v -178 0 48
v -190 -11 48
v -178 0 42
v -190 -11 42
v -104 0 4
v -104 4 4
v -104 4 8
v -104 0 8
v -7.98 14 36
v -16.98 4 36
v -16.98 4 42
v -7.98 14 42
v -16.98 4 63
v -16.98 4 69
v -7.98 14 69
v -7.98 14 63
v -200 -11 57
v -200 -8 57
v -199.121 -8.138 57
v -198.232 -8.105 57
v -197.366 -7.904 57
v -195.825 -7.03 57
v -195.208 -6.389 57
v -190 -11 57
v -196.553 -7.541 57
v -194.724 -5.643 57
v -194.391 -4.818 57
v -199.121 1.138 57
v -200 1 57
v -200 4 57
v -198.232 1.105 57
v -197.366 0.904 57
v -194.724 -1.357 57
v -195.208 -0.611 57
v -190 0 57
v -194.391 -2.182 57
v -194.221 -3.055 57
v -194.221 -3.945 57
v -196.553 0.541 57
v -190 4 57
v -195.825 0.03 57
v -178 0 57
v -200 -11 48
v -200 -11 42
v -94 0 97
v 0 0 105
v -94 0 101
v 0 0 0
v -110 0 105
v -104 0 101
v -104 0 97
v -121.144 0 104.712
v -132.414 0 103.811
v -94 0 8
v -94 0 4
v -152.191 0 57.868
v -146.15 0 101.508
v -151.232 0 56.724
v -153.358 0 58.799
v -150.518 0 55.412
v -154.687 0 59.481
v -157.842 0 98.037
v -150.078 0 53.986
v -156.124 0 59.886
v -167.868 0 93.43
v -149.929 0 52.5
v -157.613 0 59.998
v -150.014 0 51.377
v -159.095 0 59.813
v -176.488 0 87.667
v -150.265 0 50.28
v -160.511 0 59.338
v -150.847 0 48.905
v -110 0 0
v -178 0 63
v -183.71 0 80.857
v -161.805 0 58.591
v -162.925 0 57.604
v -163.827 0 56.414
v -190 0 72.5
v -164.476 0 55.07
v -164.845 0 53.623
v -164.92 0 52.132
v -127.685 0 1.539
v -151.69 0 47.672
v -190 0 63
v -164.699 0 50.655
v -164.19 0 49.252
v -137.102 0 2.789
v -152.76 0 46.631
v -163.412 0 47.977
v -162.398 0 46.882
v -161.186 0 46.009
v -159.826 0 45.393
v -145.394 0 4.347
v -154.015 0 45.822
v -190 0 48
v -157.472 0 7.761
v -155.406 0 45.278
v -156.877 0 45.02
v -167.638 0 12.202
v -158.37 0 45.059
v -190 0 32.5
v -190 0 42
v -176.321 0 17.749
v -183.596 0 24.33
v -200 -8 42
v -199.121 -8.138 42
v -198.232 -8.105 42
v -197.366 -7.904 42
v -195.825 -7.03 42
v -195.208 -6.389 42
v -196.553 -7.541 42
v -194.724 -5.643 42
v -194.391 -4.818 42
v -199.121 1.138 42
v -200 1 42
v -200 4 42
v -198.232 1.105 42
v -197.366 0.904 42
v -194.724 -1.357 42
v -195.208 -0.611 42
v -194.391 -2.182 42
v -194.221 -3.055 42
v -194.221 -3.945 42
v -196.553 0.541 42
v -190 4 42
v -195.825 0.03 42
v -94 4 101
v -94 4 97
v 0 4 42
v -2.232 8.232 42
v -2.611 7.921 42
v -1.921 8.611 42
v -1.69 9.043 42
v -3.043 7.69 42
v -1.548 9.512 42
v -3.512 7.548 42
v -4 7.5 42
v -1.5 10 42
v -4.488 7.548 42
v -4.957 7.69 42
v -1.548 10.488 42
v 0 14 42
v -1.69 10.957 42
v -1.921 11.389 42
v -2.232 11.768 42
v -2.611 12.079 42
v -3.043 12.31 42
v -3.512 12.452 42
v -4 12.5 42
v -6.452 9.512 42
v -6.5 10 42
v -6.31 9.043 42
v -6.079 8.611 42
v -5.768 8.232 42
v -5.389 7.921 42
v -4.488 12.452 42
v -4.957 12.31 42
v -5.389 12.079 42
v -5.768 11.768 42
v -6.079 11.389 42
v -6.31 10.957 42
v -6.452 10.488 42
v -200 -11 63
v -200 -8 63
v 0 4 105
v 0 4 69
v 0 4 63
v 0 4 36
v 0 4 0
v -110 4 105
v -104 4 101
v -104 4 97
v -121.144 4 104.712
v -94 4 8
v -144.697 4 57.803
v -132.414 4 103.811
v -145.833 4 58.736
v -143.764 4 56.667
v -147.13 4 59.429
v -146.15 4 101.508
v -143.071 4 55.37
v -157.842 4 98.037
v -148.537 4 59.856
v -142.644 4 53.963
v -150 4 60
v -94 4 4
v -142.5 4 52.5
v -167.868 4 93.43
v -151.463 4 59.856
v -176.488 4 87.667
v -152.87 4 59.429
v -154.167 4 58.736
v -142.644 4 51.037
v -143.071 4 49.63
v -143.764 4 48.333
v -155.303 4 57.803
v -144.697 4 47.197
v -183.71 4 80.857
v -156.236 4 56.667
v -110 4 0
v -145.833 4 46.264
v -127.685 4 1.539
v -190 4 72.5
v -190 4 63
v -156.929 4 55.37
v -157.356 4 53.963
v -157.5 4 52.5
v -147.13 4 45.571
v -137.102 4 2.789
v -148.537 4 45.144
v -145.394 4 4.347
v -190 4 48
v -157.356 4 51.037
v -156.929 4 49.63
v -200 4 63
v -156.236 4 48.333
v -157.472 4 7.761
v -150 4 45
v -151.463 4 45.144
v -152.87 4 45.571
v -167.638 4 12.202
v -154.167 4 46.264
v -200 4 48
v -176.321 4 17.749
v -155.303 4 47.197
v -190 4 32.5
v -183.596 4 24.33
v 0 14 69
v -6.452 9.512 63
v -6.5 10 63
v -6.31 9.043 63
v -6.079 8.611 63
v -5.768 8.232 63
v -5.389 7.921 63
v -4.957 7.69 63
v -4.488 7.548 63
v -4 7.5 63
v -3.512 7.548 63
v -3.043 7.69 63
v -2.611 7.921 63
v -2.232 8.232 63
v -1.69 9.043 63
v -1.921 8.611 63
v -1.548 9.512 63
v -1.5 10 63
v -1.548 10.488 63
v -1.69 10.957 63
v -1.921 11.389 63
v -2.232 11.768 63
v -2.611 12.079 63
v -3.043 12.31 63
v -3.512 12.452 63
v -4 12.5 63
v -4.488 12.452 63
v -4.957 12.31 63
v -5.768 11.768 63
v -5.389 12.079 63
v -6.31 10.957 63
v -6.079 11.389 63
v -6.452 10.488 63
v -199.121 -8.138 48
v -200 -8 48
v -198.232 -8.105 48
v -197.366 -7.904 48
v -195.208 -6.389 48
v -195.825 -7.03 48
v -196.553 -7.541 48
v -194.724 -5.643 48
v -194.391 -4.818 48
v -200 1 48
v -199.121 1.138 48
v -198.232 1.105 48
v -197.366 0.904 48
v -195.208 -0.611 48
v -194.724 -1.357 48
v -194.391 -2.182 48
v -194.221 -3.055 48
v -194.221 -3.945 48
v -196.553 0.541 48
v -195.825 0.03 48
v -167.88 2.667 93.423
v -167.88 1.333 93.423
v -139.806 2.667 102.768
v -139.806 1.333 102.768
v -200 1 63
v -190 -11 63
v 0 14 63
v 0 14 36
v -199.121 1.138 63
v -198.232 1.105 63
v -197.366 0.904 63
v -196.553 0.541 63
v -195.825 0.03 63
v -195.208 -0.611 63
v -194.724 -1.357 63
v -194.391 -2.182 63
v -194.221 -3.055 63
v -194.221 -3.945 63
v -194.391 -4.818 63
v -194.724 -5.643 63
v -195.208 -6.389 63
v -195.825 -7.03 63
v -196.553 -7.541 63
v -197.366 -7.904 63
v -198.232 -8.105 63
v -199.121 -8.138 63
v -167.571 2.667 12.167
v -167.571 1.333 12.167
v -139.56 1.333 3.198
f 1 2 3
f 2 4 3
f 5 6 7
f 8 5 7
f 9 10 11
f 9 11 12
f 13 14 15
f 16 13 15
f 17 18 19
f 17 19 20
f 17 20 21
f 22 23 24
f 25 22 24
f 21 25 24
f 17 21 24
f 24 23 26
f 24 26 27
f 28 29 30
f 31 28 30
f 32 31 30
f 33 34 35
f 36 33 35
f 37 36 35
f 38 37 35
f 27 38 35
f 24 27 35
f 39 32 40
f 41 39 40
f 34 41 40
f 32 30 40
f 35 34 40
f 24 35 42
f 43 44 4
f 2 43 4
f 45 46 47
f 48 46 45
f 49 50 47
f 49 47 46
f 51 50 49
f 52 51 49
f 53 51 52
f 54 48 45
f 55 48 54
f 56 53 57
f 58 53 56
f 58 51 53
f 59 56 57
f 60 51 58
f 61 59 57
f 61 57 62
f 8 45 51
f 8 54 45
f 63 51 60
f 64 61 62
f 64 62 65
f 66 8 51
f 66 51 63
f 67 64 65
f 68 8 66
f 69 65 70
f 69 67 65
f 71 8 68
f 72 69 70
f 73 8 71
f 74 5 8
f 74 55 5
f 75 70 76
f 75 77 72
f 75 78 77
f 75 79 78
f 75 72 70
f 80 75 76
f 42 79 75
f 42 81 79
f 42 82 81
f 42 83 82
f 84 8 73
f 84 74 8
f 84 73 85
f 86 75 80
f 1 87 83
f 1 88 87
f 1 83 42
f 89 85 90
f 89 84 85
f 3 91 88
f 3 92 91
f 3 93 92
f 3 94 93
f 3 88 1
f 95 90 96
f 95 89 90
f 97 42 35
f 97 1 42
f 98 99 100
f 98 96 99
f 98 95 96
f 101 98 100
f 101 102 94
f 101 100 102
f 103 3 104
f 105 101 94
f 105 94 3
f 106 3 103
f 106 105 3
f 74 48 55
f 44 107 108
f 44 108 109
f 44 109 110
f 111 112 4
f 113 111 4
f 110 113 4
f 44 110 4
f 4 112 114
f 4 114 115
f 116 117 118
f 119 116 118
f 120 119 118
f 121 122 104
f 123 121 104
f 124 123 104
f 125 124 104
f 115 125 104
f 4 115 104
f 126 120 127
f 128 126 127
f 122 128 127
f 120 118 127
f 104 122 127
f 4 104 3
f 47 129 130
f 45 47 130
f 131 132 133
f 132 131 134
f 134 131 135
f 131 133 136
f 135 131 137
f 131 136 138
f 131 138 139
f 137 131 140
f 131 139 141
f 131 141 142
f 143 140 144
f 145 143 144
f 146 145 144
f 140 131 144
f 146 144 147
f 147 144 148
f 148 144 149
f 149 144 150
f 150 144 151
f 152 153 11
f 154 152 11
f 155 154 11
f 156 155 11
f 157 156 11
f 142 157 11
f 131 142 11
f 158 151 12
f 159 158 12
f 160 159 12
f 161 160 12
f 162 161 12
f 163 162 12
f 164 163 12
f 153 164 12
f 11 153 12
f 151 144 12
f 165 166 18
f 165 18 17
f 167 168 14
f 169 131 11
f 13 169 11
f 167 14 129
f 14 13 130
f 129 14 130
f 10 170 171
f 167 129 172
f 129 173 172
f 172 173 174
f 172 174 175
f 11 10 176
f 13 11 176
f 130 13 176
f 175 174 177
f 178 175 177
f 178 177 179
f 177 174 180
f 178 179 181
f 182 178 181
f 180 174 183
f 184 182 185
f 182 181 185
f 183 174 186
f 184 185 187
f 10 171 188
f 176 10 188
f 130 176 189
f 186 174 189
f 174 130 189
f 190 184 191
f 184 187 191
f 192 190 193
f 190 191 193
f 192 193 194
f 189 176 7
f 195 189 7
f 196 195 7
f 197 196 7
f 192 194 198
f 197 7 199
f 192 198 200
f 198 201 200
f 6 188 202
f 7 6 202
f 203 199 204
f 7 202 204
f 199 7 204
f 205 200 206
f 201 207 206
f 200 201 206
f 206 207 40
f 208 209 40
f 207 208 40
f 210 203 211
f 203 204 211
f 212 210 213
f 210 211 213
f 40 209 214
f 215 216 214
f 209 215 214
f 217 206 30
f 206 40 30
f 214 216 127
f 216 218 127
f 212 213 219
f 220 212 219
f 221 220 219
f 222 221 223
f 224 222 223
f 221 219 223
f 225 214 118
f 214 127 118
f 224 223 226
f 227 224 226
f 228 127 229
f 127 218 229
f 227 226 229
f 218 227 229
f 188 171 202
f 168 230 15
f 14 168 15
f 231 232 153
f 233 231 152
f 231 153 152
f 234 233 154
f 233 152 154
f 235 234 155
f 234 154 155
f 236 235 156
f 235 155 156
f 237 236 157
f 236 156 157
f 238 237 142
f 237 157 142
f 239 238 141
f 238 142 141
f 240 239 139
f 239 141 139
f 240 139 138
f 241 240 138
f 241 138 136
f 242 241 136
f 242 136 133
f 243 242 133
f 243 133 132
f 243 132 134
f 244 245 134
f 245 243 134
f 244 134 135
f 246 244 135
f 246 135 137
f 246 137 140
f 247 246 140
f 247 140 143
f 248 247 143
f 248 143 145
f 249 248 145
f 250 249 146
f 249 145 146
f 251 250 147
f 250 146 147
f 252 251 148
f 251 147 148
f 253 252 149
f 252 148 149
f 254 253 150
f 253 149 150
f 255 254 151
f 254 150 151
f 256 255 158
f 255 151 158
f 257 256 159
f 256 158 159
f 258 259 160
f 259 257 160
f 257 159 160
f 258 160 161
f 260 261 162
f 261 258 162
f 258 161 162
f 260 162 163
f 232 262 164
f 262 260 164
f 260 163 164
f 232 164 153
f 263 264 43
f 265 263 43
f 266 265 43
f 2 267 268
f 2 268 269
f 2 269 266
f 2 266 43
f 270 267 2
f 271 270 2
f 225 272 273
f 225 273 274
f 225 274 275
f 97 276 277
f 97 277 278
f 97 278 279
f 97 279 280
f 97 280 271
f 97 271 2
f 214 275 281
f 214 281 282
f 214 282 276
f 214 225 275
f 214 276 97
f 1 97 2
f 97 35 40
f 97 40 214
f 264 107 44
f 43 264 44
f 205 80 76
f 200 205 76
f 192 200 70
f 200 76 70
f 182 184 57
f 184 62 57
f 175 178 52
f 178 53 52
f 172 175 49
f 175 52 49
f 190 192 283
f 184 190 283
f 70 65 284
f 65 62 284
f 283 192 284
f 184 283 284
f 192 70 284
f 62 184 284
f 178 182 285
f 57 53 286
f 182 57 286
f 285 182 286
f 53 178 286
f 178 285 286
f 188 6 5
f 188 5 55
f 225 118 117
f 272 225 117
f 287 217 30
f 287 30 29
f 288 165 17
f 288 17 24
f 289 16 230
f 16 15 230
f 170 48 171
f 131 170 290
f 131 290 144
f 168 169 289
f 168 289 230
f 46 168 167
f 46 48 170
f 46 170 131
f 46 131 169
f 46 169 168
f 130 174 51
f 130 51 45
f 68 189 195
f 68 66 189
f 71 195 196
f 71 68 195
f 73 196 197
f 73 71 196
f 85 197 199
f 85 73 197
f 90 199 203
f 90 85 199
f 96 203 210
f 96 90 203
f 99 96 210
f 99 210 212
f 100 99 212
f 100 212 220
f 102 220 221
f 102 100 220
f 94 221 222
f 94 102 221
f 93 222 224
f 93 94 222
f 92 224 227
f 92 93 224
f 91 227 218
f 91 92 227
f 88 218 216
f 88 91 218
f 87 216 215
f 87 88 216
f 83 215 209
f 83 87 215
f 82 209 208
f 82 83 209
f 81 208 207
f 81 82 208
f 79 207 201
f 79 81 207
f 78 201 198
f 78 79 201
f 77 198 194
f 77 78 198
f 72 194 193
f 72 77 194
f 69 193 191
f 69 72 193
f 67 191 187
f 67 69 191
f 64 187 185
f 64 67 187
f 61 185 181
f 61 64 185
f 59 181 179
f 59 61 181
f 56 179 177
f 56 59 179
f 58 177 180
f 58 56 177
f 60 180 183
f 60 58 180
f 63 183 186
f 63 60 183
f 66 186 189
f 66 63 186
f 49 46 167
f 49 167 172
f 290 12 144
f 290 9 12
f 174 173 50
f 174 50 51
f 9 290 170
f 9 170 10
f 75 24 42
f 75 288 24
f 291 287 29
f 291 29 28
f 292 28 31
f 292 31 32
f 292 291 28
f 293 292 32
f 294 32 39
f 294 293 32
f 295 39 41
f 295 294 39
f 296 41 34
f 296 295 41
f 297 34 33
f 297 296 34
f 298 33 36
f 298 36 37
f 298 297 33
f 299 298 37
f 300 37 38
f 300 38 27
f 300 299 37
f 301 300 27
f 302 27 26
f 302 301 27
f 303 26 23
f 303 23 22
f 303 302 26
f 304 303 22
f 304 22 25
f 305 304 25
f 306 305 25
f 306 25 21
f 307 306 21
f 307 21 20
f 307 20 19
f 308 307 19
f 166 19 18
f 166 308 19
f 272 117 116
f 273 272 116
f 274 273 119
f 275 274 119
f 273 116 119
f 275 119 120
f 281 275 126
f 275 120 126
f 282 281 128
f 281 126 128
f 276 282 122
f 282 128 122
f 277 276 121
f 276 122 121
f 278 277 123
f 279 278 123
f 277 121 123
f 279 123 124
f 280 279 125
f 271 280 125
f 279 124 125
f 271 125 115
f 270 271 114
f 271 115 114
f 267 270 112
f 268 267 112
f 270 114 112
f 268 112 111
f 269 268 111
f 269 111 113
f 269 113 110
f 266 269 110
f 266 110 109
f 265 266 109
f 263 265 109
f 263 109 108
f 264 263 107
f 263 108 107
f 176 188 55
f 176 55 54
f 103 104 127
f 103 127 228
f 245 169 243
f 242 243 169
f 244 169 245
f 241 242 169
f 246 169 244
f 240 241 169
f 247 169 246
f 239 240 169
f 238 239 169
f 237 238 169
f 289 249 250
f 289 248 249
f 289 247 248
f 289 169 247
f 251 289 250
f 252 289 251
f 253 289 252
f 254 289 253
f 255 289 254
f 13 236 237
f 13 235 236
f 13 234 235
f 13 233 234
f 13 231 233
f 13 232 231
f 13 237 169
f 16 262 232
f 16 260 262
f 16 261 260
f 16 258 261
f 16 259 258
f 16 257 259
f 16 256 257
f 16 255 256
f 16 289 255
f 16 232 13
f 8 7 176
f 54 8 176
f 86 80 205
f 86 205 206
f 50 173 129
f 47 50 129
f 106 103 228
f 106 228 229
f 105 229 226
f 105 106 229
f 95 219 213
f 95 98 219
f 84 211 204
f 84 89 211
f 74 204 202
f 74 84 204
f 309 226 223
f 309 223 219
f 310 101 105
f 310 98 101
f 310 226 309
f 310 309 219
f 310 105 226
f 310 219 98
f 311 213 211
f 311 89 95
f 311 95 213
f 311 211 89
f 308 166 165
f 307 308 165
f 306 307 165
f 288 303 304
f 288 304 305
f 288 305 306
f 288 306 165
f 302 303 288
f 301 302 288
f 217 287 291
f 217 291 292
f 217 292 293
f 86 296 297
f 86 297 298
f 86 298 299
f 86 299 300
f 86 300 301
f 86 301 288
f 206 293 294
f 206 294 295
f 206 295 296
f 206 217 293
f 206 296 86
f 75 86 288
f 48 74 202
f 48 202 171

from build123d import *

# Parameters (mm, degrees)
BOSS_EXTRUDE1_DEPTH = 4
BOSS_EXTRUDE2_START = -45
BOSS_EXTRUDE2_DEPTH = 3
BOSS_EXTRUDE3_START = -39
BOSS_EXTRUDE3_DEPTH = 3
BOSS_EXTRUDE4_REACH = 212.155
SKETCH6_R           = 2.5
SKETCH7_W           = 10
SKETCH7_H           = 4
CUT_EXTRUDE1_DEPTH  = 10
SKETCH8_R           = 7.5


with BuildPart() as part:
    # Sketch1 → Boss-Extrude1 (new body)
    with BuildSketch(Plane(origin=(0, 0, 0), x_dir=(1, 0, 0), z_dir=(0, 1, 0))):
        with BuildLine():
            Line((-110, 0), (0, 0))
            Line((0, 0), (0, -105))
            Line((0, -105), (-110, -105))
            add(Edge.make_bspline(
                [(-190, -72.5), (-172.262756658, -100.700379519), (-139.265999107, -104.836107107), (-110, -105)],
                knots=[0, 0, 0, 0, 1, 1, 1, 1], degree=3))
            Line((-190, -72.5), (-190, -32.5))
            add(Edge.make_bspline(
                [(-190, -32.5), (-171.707374586, -4.618888995), (-138.989901699, -2.178666842), (-110, 0)],
                knots=[0, 0, 0, 0, 1, 1, 1, 1], degree=3))
        make_face()
    extrude(amount=BOSS_EXTRUDE1_DEPTH)

    # Sketch2 → Boss-Extrude2 (add, symmetric)
    with BuildSketch(Plane.XY.offset(105).offset(BOSS_EXTRUDE2_START)):
        with BuildLine():
            Line((-190, 4), (-200, 4))
            Line((-200, 4), (-200, 1))
            ThreePointArc((-200, 1), (-194.2, -3.5), (-200, -8))
            Line((-200, -8), (-200, -11))
            Line((-200, -11), (-190, -11))
            Line((-190, -11), (-178, 0))
            Line((-178, 0), (-190, 4))
        make_face()
    boss_extrude2 = extrude(amount=BOSS_EXTRUDE2_DEPTH, both=True)

    # Mirror1: Boss-Extrude2 across plane
    add(boss_extrude2.mirror(Plane.XY.offset(52.5)))

    # Sketch5 → Boss-Extrude3 (add, symmetric)
    with BuildSketch(Plane.XY.offset(105).offset(BOSS_EXTRUDE3_START)):
        Polygon((-16.979807258, 4), (-7.979807258, 14), (0, 14), (0, 4), align=None)
    boss_extrude3 = extrude(amount=BOSS_EXTRUDE3_DEPTH, both=True)

    # Mirror4: Boss-Extrude3 across plane
    add(boss_extrude3.mirror(Plane.XY.offset(52.5)))

    # Sketch6 → Boss-Extrude4 (add, up to next)
    with BuildSketch(Plane.XY.offset(42), mode=Mode.PRIVATE) as boss_extrude4_sk1:
        with Locations(Location((-4, 10, 0), (0, 0, 180))):
            Circle(SKETCH6_R)
    boss_extrude4_tool1 = extrude(boss_extrude4_sk1.sketch, amount=BOSS_EXTRUDE4_REACH, mode=Mode.PRIVATE) - part.part
    add(boss_extrude4_tool1.solids().sort_by_distance((-4, 10, 42))[0])

    # Sketch7 → Cut-Extrude1 (cut)
    with BuildSketch(Plane(origin=(0, 4, 0), x_dir=(1, 0, 0), z_dir=(0, 1, 0))):
        with Locations((-99, -99)):
            Rectangle(SKETCH7_W, SKETCH7_H)
    cut_extrude1 = extrude(amount=-CUT_EXTRUDE1_DEPTH, mode=Mode.SUBTRACT)

    # Mirror5: Cut-Extrude1 across plane
    add(cut_extrude1.mirror(Plane.XY.offset(52.5)), mode=Mode.SUBTRACT)

    # Cut-Sweep1: sweep along a path in Sketch9
    with BuildLine(Plane.XY.offset(52.5)) as cut_sweep1_path:
        Line((-150, 4), (-163.867437875, -3.466183031))
    # Sketch8 → Cut-Sweep1 (sweep, cut)
    with BuildSketch(Plane(origin=(0, 4, 0), x_dir=(1, 0, 0), z_dir=(0, 1, 0))):
        with Locations((-150, -52.5)):
            Circle(SKETCH8_R)
    sweep(path=cut_sweep1_path.line, mode=Mode.SUBTRACT)


solid = part.part
